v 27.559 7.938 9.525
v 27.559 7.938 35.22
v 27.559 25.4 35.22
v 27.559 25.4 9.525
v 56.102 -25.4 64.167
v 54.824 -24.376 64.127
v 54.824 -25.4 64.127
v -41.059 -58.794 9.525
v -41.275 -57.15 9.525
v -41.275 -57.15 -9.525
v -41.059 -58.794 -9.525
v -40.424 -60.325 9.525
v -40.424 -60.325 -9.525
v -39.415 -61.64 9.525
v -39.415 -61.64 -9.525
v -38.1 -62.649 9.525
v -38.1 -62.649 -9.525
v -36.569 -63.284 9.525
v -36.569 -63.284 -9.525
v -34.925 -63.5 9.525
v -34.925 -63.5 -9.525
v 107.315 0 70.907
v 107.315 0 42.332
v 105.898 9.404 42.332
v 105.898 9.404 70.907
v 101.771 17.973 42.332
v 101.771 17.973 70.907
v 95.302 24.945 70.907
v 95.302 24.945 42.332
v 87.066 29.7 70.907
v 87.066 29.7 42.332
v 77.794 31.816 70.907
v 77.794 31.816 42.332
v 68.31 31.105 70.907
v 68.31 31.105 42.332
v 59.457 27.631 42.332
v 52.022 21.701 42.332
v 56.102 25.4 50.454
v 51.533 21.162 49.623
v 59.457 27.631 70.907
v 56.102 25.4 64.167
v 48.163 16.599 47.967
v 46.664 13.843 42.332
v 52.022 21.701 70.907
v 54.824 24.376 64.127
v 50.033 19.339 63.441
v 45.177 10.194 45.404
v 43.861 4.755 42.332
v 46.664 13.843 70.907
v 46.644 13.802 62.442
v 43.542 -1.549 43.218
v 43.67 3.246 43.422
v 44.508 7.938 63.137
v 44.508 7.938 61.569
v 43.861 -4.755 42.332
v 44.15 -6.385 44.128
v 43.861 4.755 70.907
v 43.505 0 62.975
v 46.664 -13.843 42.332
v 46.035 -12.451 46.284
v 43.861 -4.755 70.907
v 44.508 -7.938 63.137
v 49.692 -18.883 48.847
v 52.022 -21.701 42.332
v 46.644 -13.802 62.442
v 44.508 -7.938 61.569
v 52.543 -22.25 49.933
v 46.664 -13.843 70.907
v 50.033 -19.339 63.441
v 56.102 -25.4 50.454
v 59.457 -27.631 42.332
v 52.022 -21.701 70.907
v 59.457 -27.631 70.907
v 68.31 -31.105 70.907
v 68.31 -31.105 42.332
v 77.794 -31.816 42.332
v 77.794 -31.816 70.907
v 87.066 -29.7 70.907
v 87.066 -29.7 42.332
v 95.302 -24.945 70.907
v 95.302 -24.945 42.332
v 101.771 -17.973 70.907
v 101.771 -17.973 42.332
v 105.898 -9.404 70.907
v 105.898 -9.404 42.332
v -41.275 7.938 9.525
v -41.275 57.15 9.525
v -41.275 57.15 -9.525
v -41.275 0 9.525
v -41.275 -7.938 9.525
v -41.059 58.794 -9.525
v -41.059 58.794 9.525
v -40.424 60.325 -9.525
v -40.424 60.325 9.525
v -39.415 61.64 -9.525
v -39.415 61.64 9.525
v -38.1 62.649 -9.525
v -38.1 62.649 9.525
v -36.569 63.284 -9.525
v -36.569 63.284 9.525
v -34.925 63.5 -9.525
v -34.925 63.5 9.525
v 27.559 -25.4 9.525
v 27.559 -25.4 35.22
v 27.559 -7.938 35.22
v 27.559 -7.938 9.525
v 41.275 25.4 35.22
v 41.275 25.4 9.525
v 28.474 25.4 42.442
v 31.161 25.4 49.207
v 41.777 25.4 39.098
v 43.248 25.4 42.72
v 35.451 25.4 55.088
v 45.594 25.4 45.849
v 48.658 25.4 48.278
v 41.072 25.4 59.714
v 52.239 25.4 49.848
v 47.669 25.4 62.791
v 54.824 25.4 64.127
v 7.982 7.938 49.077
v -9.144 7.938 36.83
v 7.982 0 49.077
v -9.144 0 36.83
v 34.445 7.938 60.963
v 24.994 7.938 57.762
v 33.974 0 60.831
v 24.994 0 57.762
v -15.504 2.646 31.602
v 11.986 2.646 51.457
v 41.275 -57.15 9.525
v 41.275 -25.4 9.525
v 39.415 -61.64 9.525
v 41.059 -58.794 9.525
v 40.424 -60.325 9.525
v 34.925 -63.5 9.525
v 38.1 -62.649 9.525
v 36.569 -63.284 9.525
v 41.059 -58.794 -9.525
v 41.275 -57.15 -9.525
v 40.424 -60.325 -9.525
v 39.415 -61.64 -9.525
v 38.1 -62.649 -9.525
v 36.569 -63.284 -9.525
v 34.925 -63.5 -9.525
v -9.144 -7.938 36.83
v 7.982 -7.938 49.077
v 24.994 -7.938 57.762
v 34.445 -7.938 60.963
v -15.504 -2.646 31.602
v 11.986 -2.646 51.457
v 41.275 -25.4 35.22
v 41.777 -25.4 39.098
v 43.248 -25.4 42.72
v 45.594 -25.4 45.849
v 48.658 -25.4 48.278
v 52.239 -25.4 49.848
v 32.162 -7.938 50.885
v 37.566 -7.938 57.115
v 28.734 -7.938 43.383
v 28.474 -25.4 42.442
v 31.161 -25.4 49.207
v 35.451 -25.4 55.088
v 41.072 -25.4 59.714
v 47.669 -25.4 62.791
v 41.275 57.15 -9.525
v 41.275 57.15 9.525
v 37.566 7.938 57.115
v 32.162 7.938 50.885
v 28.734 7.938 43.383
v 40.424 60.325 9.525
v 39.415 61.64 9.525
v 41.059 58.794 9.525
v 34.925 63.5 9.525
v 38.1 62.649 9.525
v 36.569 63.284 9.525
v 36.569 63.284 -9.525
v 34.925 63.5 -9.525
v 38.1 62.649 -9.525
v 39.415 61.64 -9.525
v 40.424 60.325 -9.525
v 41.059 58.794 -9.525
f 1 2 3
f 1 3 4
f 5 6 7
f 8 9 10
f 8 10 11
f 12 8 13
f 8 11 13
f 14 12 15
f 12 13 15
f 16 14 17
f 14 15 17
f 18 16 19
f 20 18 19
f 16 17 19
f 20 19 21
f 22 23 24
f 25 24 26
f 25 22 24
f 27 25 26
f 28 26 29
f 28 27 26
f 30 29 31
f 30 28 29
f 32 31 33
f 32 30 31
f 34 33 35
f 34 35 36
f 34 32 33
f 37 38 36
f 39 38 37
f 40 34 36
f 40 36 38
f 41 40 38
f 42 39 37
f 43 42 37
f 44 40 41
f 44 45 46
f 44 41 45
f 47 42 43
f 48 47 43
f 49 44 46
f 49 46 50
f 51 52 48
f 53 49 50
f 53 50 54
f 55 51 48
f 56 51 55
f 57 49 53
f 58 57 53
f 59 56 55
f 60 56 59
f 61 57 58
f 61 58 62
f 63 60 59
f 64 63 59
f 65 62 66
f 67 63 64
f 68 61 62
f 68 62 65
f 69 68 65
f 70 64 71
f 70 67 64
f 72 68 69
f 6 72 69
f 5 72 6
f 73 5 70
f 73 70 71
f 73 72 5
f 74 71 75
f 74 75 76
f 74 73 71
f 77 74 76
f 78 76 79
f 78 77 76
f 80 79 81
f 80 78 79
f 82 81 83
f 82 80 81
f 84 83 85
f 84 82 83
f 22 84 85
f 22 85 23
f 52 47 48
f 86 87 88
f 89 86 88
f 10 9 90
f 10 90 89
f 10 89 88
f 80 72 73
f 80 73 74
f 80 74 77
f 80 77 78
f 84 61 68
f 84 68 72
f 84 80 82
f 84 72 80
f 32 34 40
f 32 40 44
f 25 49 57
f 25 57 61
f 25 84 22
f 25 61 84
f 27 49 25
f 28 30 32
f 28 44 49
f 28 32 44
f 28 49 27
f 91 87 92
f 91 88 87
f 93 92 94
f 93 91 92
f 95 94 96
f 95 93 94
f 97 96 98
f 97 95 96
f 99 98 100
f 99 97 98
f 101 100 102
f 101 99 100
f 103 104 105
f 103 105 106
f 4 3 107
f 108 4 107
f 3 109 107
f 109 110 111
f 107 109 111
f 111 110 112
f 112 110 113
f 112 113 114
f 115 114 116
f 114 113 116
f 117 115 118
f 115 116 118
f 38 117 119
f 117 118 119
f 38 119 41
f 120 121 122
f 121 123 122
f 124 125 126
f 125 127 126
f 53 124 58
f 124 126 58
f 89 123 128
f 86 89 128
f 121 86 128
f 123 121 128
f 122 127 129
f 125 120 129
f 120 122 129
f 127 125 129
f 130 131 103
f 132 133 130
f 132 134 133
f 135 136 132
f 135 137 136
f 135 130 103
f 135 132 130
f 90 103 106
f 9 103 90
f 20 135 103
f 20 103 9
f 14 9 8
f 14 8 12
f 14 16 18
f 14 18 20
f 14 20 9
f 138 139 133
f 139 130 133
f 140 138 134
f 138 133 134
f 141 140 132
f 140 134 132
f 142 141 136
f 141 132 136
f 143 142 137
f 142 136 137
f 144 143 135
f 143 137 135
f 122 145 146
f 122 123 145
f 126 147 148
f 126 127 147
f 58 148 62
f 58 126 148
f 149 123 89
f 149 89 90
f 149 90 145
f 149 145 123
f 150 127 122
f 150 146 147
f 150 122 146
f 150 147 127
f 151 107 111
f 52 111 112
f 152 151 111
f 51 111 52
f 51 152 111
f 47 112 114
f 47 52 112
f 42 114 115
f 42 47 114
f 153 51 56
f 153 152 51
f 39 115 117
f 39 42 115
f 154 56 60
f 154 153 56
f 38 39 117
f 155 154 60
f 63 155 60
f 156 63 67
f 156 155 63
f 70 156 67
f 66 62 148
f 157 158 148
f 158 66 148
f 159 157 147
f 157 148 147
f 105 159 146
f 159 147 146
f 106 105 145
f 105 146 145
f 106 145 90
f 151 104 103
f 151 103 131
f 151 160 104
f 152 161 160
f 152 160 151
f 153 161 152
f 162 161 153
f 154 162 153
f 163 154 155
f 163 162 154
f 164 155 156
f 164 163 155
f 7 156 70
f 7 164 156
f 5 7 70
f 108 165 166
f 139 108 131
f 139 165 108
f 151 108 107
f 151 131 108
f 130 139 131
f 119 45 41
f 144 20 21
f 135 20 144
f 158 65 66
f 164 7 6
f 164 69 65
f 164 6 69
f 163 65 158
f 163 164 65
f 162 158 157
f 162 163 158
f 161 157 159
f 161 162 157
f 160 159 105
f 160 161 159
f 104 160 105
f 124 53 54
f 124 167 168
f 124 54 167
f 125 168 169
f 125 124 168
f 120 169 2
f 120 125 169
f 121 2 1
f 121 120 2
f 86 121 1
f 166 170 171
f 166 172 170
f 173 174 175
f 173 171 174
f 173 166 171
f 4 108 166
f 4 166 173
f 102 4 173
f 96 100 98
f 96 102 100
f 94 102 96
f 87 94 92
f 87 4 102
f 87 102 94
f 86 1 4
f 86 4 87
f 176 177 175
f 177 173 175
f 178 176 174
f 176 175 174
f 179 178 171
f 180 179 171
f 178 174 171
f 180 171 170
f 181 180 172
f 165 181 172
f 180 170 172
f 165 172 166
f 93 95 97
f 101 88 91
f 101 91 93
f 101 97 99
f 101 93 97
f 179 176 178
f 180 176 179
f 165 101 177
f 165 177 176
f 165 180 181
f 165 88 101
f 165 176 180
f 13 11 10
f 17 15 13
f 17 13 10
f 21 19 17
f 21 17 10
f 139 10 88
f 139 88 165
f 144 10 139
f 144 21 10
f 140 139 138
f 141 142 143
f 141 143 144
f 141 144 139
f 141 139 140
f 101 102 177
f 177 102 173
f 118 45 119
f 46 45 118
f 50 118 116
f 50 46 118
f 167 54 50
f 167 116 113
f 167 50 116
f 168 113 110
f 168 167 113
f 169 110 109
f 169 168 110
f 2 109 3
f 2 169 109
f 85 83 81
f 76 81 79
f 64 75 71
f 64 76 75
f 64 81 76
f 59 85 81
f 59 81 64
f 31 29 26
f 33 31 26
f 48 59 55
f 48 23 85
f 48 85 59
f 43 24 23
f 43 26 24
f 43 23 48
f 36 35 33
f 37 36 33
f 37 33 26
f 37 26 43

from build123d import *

# Parameters (mm, degrees)
F1_DEPTH = 63.5
F2_DEPTH = 7.9375
F3_DEPTH = 25.4
F4_R     = 6.35


# Not quite as in the source:
# - ends of sketch curves that miss each other by under 0.0002 mm in the source are joined


with BuildPart() as f1:
    # F0 (on Front) → F1 (new body, symmetric)
    with BuildSketch(Plane.XZ):
        Polygon((-41.275, 9.525), (-41.275, -9.525), (41.275, -9.525), (41.275, 9.525), (27.5589991361, 9.525), align=None)
    extrude(amount=F1_DEPTH, both=True)

    # F0 (on Front) → F2 (join, symmetric)
    with BuildSketch(Plane.XZ):
        with BuildLine():
            add(Edge.make_bspline(
                [(-41.275, 9.525), (-12.8610799571, 32.6827113613), (12.6950968294, 62.5117734864), (54.8244975817, 64.1265564996)],
                knots=[0, 0, 0, 0, 110.5540678871, 110.5540678871, 110.5540678871, 110.5540678871], degree=3))
            Line((-41.275, 9.525), (27.5589991361, 9.525))
            Line((27.5589991361, 9.525), (27.5589991361, 35.2199450135))
            ThreePointArc((27.5589991361, 35.2199450135), (35.450810299, 55.0882589398), (54.8244975817, 64.1265564996))
        make_face()
    extrude(amount=F2_DEPTH, both=True)

    # F0 (on Front) → F3 (join, symmetric)
    with BuildSketch(Plane.XZ):
        with BuildLine():
            Line((27.5589991361, 9.525), (41.275, 9.525))
            Line((41.275, 9.525), (41.275, 35.2199450135))
            ThreePointArc((41.275, 35.2199450135), (45.7386926547, 45.9962523588), (56.515, 50.4599450135))
            Line((56.515, 50.4599450135), (56.515, 64.1759467518))
            add(Edge.make_bspline(
                [(54.8244975817, 64.1265564996), (55.3850490812, 64.1480419473), (55.9485346305, 64.1645324648), (56.515, 64.1759467518)],
                knots=[110.5540678871, 110.5540678871, 110.5540678871, 110.5540678871, 112.0250417777, 112.0250417777, 112.0250417777, 112.0250417777], degree=3))
            ThreePointArc((54.8244975817, 64.1265564996), (35.450810299, 55.0882589398), (27.5589991361, 35.2199450135))
            Line((27.5589991361, 35.2199450135), (27.5589991361, 9.525))
        make_face()
    extrude(amount=F3_DEPTH, both=True)

    # F4
    f4_edges = [f1.edges().sort_by_distance(p)[0] for p in [
        (-41.275, -63.5, 0),
        (41.275, -63.5, 0),
        (41.275, 63.5, 0),
        (-41.275, 63.5, 0),
    ]]
    fillet(f4_edges, radius=F4_R)

    # F0 (on Front) → F5 (revolve)
    with BuildSketch(Plane.XZ):
        Polygon((75.4097700119, 70.9069057465), (75.4097700119, 64.1759485006), (75.4097700119, 50.4599450135), (75.4097700119, 42.3319057465), (107.315, 42.3319057465), (107.315, 70.9069057465), align=None)
    revolve(axis=Axis((75.4097700119, 0, 56.6194057465), (0, 0, 1)))


solid = f1.part
